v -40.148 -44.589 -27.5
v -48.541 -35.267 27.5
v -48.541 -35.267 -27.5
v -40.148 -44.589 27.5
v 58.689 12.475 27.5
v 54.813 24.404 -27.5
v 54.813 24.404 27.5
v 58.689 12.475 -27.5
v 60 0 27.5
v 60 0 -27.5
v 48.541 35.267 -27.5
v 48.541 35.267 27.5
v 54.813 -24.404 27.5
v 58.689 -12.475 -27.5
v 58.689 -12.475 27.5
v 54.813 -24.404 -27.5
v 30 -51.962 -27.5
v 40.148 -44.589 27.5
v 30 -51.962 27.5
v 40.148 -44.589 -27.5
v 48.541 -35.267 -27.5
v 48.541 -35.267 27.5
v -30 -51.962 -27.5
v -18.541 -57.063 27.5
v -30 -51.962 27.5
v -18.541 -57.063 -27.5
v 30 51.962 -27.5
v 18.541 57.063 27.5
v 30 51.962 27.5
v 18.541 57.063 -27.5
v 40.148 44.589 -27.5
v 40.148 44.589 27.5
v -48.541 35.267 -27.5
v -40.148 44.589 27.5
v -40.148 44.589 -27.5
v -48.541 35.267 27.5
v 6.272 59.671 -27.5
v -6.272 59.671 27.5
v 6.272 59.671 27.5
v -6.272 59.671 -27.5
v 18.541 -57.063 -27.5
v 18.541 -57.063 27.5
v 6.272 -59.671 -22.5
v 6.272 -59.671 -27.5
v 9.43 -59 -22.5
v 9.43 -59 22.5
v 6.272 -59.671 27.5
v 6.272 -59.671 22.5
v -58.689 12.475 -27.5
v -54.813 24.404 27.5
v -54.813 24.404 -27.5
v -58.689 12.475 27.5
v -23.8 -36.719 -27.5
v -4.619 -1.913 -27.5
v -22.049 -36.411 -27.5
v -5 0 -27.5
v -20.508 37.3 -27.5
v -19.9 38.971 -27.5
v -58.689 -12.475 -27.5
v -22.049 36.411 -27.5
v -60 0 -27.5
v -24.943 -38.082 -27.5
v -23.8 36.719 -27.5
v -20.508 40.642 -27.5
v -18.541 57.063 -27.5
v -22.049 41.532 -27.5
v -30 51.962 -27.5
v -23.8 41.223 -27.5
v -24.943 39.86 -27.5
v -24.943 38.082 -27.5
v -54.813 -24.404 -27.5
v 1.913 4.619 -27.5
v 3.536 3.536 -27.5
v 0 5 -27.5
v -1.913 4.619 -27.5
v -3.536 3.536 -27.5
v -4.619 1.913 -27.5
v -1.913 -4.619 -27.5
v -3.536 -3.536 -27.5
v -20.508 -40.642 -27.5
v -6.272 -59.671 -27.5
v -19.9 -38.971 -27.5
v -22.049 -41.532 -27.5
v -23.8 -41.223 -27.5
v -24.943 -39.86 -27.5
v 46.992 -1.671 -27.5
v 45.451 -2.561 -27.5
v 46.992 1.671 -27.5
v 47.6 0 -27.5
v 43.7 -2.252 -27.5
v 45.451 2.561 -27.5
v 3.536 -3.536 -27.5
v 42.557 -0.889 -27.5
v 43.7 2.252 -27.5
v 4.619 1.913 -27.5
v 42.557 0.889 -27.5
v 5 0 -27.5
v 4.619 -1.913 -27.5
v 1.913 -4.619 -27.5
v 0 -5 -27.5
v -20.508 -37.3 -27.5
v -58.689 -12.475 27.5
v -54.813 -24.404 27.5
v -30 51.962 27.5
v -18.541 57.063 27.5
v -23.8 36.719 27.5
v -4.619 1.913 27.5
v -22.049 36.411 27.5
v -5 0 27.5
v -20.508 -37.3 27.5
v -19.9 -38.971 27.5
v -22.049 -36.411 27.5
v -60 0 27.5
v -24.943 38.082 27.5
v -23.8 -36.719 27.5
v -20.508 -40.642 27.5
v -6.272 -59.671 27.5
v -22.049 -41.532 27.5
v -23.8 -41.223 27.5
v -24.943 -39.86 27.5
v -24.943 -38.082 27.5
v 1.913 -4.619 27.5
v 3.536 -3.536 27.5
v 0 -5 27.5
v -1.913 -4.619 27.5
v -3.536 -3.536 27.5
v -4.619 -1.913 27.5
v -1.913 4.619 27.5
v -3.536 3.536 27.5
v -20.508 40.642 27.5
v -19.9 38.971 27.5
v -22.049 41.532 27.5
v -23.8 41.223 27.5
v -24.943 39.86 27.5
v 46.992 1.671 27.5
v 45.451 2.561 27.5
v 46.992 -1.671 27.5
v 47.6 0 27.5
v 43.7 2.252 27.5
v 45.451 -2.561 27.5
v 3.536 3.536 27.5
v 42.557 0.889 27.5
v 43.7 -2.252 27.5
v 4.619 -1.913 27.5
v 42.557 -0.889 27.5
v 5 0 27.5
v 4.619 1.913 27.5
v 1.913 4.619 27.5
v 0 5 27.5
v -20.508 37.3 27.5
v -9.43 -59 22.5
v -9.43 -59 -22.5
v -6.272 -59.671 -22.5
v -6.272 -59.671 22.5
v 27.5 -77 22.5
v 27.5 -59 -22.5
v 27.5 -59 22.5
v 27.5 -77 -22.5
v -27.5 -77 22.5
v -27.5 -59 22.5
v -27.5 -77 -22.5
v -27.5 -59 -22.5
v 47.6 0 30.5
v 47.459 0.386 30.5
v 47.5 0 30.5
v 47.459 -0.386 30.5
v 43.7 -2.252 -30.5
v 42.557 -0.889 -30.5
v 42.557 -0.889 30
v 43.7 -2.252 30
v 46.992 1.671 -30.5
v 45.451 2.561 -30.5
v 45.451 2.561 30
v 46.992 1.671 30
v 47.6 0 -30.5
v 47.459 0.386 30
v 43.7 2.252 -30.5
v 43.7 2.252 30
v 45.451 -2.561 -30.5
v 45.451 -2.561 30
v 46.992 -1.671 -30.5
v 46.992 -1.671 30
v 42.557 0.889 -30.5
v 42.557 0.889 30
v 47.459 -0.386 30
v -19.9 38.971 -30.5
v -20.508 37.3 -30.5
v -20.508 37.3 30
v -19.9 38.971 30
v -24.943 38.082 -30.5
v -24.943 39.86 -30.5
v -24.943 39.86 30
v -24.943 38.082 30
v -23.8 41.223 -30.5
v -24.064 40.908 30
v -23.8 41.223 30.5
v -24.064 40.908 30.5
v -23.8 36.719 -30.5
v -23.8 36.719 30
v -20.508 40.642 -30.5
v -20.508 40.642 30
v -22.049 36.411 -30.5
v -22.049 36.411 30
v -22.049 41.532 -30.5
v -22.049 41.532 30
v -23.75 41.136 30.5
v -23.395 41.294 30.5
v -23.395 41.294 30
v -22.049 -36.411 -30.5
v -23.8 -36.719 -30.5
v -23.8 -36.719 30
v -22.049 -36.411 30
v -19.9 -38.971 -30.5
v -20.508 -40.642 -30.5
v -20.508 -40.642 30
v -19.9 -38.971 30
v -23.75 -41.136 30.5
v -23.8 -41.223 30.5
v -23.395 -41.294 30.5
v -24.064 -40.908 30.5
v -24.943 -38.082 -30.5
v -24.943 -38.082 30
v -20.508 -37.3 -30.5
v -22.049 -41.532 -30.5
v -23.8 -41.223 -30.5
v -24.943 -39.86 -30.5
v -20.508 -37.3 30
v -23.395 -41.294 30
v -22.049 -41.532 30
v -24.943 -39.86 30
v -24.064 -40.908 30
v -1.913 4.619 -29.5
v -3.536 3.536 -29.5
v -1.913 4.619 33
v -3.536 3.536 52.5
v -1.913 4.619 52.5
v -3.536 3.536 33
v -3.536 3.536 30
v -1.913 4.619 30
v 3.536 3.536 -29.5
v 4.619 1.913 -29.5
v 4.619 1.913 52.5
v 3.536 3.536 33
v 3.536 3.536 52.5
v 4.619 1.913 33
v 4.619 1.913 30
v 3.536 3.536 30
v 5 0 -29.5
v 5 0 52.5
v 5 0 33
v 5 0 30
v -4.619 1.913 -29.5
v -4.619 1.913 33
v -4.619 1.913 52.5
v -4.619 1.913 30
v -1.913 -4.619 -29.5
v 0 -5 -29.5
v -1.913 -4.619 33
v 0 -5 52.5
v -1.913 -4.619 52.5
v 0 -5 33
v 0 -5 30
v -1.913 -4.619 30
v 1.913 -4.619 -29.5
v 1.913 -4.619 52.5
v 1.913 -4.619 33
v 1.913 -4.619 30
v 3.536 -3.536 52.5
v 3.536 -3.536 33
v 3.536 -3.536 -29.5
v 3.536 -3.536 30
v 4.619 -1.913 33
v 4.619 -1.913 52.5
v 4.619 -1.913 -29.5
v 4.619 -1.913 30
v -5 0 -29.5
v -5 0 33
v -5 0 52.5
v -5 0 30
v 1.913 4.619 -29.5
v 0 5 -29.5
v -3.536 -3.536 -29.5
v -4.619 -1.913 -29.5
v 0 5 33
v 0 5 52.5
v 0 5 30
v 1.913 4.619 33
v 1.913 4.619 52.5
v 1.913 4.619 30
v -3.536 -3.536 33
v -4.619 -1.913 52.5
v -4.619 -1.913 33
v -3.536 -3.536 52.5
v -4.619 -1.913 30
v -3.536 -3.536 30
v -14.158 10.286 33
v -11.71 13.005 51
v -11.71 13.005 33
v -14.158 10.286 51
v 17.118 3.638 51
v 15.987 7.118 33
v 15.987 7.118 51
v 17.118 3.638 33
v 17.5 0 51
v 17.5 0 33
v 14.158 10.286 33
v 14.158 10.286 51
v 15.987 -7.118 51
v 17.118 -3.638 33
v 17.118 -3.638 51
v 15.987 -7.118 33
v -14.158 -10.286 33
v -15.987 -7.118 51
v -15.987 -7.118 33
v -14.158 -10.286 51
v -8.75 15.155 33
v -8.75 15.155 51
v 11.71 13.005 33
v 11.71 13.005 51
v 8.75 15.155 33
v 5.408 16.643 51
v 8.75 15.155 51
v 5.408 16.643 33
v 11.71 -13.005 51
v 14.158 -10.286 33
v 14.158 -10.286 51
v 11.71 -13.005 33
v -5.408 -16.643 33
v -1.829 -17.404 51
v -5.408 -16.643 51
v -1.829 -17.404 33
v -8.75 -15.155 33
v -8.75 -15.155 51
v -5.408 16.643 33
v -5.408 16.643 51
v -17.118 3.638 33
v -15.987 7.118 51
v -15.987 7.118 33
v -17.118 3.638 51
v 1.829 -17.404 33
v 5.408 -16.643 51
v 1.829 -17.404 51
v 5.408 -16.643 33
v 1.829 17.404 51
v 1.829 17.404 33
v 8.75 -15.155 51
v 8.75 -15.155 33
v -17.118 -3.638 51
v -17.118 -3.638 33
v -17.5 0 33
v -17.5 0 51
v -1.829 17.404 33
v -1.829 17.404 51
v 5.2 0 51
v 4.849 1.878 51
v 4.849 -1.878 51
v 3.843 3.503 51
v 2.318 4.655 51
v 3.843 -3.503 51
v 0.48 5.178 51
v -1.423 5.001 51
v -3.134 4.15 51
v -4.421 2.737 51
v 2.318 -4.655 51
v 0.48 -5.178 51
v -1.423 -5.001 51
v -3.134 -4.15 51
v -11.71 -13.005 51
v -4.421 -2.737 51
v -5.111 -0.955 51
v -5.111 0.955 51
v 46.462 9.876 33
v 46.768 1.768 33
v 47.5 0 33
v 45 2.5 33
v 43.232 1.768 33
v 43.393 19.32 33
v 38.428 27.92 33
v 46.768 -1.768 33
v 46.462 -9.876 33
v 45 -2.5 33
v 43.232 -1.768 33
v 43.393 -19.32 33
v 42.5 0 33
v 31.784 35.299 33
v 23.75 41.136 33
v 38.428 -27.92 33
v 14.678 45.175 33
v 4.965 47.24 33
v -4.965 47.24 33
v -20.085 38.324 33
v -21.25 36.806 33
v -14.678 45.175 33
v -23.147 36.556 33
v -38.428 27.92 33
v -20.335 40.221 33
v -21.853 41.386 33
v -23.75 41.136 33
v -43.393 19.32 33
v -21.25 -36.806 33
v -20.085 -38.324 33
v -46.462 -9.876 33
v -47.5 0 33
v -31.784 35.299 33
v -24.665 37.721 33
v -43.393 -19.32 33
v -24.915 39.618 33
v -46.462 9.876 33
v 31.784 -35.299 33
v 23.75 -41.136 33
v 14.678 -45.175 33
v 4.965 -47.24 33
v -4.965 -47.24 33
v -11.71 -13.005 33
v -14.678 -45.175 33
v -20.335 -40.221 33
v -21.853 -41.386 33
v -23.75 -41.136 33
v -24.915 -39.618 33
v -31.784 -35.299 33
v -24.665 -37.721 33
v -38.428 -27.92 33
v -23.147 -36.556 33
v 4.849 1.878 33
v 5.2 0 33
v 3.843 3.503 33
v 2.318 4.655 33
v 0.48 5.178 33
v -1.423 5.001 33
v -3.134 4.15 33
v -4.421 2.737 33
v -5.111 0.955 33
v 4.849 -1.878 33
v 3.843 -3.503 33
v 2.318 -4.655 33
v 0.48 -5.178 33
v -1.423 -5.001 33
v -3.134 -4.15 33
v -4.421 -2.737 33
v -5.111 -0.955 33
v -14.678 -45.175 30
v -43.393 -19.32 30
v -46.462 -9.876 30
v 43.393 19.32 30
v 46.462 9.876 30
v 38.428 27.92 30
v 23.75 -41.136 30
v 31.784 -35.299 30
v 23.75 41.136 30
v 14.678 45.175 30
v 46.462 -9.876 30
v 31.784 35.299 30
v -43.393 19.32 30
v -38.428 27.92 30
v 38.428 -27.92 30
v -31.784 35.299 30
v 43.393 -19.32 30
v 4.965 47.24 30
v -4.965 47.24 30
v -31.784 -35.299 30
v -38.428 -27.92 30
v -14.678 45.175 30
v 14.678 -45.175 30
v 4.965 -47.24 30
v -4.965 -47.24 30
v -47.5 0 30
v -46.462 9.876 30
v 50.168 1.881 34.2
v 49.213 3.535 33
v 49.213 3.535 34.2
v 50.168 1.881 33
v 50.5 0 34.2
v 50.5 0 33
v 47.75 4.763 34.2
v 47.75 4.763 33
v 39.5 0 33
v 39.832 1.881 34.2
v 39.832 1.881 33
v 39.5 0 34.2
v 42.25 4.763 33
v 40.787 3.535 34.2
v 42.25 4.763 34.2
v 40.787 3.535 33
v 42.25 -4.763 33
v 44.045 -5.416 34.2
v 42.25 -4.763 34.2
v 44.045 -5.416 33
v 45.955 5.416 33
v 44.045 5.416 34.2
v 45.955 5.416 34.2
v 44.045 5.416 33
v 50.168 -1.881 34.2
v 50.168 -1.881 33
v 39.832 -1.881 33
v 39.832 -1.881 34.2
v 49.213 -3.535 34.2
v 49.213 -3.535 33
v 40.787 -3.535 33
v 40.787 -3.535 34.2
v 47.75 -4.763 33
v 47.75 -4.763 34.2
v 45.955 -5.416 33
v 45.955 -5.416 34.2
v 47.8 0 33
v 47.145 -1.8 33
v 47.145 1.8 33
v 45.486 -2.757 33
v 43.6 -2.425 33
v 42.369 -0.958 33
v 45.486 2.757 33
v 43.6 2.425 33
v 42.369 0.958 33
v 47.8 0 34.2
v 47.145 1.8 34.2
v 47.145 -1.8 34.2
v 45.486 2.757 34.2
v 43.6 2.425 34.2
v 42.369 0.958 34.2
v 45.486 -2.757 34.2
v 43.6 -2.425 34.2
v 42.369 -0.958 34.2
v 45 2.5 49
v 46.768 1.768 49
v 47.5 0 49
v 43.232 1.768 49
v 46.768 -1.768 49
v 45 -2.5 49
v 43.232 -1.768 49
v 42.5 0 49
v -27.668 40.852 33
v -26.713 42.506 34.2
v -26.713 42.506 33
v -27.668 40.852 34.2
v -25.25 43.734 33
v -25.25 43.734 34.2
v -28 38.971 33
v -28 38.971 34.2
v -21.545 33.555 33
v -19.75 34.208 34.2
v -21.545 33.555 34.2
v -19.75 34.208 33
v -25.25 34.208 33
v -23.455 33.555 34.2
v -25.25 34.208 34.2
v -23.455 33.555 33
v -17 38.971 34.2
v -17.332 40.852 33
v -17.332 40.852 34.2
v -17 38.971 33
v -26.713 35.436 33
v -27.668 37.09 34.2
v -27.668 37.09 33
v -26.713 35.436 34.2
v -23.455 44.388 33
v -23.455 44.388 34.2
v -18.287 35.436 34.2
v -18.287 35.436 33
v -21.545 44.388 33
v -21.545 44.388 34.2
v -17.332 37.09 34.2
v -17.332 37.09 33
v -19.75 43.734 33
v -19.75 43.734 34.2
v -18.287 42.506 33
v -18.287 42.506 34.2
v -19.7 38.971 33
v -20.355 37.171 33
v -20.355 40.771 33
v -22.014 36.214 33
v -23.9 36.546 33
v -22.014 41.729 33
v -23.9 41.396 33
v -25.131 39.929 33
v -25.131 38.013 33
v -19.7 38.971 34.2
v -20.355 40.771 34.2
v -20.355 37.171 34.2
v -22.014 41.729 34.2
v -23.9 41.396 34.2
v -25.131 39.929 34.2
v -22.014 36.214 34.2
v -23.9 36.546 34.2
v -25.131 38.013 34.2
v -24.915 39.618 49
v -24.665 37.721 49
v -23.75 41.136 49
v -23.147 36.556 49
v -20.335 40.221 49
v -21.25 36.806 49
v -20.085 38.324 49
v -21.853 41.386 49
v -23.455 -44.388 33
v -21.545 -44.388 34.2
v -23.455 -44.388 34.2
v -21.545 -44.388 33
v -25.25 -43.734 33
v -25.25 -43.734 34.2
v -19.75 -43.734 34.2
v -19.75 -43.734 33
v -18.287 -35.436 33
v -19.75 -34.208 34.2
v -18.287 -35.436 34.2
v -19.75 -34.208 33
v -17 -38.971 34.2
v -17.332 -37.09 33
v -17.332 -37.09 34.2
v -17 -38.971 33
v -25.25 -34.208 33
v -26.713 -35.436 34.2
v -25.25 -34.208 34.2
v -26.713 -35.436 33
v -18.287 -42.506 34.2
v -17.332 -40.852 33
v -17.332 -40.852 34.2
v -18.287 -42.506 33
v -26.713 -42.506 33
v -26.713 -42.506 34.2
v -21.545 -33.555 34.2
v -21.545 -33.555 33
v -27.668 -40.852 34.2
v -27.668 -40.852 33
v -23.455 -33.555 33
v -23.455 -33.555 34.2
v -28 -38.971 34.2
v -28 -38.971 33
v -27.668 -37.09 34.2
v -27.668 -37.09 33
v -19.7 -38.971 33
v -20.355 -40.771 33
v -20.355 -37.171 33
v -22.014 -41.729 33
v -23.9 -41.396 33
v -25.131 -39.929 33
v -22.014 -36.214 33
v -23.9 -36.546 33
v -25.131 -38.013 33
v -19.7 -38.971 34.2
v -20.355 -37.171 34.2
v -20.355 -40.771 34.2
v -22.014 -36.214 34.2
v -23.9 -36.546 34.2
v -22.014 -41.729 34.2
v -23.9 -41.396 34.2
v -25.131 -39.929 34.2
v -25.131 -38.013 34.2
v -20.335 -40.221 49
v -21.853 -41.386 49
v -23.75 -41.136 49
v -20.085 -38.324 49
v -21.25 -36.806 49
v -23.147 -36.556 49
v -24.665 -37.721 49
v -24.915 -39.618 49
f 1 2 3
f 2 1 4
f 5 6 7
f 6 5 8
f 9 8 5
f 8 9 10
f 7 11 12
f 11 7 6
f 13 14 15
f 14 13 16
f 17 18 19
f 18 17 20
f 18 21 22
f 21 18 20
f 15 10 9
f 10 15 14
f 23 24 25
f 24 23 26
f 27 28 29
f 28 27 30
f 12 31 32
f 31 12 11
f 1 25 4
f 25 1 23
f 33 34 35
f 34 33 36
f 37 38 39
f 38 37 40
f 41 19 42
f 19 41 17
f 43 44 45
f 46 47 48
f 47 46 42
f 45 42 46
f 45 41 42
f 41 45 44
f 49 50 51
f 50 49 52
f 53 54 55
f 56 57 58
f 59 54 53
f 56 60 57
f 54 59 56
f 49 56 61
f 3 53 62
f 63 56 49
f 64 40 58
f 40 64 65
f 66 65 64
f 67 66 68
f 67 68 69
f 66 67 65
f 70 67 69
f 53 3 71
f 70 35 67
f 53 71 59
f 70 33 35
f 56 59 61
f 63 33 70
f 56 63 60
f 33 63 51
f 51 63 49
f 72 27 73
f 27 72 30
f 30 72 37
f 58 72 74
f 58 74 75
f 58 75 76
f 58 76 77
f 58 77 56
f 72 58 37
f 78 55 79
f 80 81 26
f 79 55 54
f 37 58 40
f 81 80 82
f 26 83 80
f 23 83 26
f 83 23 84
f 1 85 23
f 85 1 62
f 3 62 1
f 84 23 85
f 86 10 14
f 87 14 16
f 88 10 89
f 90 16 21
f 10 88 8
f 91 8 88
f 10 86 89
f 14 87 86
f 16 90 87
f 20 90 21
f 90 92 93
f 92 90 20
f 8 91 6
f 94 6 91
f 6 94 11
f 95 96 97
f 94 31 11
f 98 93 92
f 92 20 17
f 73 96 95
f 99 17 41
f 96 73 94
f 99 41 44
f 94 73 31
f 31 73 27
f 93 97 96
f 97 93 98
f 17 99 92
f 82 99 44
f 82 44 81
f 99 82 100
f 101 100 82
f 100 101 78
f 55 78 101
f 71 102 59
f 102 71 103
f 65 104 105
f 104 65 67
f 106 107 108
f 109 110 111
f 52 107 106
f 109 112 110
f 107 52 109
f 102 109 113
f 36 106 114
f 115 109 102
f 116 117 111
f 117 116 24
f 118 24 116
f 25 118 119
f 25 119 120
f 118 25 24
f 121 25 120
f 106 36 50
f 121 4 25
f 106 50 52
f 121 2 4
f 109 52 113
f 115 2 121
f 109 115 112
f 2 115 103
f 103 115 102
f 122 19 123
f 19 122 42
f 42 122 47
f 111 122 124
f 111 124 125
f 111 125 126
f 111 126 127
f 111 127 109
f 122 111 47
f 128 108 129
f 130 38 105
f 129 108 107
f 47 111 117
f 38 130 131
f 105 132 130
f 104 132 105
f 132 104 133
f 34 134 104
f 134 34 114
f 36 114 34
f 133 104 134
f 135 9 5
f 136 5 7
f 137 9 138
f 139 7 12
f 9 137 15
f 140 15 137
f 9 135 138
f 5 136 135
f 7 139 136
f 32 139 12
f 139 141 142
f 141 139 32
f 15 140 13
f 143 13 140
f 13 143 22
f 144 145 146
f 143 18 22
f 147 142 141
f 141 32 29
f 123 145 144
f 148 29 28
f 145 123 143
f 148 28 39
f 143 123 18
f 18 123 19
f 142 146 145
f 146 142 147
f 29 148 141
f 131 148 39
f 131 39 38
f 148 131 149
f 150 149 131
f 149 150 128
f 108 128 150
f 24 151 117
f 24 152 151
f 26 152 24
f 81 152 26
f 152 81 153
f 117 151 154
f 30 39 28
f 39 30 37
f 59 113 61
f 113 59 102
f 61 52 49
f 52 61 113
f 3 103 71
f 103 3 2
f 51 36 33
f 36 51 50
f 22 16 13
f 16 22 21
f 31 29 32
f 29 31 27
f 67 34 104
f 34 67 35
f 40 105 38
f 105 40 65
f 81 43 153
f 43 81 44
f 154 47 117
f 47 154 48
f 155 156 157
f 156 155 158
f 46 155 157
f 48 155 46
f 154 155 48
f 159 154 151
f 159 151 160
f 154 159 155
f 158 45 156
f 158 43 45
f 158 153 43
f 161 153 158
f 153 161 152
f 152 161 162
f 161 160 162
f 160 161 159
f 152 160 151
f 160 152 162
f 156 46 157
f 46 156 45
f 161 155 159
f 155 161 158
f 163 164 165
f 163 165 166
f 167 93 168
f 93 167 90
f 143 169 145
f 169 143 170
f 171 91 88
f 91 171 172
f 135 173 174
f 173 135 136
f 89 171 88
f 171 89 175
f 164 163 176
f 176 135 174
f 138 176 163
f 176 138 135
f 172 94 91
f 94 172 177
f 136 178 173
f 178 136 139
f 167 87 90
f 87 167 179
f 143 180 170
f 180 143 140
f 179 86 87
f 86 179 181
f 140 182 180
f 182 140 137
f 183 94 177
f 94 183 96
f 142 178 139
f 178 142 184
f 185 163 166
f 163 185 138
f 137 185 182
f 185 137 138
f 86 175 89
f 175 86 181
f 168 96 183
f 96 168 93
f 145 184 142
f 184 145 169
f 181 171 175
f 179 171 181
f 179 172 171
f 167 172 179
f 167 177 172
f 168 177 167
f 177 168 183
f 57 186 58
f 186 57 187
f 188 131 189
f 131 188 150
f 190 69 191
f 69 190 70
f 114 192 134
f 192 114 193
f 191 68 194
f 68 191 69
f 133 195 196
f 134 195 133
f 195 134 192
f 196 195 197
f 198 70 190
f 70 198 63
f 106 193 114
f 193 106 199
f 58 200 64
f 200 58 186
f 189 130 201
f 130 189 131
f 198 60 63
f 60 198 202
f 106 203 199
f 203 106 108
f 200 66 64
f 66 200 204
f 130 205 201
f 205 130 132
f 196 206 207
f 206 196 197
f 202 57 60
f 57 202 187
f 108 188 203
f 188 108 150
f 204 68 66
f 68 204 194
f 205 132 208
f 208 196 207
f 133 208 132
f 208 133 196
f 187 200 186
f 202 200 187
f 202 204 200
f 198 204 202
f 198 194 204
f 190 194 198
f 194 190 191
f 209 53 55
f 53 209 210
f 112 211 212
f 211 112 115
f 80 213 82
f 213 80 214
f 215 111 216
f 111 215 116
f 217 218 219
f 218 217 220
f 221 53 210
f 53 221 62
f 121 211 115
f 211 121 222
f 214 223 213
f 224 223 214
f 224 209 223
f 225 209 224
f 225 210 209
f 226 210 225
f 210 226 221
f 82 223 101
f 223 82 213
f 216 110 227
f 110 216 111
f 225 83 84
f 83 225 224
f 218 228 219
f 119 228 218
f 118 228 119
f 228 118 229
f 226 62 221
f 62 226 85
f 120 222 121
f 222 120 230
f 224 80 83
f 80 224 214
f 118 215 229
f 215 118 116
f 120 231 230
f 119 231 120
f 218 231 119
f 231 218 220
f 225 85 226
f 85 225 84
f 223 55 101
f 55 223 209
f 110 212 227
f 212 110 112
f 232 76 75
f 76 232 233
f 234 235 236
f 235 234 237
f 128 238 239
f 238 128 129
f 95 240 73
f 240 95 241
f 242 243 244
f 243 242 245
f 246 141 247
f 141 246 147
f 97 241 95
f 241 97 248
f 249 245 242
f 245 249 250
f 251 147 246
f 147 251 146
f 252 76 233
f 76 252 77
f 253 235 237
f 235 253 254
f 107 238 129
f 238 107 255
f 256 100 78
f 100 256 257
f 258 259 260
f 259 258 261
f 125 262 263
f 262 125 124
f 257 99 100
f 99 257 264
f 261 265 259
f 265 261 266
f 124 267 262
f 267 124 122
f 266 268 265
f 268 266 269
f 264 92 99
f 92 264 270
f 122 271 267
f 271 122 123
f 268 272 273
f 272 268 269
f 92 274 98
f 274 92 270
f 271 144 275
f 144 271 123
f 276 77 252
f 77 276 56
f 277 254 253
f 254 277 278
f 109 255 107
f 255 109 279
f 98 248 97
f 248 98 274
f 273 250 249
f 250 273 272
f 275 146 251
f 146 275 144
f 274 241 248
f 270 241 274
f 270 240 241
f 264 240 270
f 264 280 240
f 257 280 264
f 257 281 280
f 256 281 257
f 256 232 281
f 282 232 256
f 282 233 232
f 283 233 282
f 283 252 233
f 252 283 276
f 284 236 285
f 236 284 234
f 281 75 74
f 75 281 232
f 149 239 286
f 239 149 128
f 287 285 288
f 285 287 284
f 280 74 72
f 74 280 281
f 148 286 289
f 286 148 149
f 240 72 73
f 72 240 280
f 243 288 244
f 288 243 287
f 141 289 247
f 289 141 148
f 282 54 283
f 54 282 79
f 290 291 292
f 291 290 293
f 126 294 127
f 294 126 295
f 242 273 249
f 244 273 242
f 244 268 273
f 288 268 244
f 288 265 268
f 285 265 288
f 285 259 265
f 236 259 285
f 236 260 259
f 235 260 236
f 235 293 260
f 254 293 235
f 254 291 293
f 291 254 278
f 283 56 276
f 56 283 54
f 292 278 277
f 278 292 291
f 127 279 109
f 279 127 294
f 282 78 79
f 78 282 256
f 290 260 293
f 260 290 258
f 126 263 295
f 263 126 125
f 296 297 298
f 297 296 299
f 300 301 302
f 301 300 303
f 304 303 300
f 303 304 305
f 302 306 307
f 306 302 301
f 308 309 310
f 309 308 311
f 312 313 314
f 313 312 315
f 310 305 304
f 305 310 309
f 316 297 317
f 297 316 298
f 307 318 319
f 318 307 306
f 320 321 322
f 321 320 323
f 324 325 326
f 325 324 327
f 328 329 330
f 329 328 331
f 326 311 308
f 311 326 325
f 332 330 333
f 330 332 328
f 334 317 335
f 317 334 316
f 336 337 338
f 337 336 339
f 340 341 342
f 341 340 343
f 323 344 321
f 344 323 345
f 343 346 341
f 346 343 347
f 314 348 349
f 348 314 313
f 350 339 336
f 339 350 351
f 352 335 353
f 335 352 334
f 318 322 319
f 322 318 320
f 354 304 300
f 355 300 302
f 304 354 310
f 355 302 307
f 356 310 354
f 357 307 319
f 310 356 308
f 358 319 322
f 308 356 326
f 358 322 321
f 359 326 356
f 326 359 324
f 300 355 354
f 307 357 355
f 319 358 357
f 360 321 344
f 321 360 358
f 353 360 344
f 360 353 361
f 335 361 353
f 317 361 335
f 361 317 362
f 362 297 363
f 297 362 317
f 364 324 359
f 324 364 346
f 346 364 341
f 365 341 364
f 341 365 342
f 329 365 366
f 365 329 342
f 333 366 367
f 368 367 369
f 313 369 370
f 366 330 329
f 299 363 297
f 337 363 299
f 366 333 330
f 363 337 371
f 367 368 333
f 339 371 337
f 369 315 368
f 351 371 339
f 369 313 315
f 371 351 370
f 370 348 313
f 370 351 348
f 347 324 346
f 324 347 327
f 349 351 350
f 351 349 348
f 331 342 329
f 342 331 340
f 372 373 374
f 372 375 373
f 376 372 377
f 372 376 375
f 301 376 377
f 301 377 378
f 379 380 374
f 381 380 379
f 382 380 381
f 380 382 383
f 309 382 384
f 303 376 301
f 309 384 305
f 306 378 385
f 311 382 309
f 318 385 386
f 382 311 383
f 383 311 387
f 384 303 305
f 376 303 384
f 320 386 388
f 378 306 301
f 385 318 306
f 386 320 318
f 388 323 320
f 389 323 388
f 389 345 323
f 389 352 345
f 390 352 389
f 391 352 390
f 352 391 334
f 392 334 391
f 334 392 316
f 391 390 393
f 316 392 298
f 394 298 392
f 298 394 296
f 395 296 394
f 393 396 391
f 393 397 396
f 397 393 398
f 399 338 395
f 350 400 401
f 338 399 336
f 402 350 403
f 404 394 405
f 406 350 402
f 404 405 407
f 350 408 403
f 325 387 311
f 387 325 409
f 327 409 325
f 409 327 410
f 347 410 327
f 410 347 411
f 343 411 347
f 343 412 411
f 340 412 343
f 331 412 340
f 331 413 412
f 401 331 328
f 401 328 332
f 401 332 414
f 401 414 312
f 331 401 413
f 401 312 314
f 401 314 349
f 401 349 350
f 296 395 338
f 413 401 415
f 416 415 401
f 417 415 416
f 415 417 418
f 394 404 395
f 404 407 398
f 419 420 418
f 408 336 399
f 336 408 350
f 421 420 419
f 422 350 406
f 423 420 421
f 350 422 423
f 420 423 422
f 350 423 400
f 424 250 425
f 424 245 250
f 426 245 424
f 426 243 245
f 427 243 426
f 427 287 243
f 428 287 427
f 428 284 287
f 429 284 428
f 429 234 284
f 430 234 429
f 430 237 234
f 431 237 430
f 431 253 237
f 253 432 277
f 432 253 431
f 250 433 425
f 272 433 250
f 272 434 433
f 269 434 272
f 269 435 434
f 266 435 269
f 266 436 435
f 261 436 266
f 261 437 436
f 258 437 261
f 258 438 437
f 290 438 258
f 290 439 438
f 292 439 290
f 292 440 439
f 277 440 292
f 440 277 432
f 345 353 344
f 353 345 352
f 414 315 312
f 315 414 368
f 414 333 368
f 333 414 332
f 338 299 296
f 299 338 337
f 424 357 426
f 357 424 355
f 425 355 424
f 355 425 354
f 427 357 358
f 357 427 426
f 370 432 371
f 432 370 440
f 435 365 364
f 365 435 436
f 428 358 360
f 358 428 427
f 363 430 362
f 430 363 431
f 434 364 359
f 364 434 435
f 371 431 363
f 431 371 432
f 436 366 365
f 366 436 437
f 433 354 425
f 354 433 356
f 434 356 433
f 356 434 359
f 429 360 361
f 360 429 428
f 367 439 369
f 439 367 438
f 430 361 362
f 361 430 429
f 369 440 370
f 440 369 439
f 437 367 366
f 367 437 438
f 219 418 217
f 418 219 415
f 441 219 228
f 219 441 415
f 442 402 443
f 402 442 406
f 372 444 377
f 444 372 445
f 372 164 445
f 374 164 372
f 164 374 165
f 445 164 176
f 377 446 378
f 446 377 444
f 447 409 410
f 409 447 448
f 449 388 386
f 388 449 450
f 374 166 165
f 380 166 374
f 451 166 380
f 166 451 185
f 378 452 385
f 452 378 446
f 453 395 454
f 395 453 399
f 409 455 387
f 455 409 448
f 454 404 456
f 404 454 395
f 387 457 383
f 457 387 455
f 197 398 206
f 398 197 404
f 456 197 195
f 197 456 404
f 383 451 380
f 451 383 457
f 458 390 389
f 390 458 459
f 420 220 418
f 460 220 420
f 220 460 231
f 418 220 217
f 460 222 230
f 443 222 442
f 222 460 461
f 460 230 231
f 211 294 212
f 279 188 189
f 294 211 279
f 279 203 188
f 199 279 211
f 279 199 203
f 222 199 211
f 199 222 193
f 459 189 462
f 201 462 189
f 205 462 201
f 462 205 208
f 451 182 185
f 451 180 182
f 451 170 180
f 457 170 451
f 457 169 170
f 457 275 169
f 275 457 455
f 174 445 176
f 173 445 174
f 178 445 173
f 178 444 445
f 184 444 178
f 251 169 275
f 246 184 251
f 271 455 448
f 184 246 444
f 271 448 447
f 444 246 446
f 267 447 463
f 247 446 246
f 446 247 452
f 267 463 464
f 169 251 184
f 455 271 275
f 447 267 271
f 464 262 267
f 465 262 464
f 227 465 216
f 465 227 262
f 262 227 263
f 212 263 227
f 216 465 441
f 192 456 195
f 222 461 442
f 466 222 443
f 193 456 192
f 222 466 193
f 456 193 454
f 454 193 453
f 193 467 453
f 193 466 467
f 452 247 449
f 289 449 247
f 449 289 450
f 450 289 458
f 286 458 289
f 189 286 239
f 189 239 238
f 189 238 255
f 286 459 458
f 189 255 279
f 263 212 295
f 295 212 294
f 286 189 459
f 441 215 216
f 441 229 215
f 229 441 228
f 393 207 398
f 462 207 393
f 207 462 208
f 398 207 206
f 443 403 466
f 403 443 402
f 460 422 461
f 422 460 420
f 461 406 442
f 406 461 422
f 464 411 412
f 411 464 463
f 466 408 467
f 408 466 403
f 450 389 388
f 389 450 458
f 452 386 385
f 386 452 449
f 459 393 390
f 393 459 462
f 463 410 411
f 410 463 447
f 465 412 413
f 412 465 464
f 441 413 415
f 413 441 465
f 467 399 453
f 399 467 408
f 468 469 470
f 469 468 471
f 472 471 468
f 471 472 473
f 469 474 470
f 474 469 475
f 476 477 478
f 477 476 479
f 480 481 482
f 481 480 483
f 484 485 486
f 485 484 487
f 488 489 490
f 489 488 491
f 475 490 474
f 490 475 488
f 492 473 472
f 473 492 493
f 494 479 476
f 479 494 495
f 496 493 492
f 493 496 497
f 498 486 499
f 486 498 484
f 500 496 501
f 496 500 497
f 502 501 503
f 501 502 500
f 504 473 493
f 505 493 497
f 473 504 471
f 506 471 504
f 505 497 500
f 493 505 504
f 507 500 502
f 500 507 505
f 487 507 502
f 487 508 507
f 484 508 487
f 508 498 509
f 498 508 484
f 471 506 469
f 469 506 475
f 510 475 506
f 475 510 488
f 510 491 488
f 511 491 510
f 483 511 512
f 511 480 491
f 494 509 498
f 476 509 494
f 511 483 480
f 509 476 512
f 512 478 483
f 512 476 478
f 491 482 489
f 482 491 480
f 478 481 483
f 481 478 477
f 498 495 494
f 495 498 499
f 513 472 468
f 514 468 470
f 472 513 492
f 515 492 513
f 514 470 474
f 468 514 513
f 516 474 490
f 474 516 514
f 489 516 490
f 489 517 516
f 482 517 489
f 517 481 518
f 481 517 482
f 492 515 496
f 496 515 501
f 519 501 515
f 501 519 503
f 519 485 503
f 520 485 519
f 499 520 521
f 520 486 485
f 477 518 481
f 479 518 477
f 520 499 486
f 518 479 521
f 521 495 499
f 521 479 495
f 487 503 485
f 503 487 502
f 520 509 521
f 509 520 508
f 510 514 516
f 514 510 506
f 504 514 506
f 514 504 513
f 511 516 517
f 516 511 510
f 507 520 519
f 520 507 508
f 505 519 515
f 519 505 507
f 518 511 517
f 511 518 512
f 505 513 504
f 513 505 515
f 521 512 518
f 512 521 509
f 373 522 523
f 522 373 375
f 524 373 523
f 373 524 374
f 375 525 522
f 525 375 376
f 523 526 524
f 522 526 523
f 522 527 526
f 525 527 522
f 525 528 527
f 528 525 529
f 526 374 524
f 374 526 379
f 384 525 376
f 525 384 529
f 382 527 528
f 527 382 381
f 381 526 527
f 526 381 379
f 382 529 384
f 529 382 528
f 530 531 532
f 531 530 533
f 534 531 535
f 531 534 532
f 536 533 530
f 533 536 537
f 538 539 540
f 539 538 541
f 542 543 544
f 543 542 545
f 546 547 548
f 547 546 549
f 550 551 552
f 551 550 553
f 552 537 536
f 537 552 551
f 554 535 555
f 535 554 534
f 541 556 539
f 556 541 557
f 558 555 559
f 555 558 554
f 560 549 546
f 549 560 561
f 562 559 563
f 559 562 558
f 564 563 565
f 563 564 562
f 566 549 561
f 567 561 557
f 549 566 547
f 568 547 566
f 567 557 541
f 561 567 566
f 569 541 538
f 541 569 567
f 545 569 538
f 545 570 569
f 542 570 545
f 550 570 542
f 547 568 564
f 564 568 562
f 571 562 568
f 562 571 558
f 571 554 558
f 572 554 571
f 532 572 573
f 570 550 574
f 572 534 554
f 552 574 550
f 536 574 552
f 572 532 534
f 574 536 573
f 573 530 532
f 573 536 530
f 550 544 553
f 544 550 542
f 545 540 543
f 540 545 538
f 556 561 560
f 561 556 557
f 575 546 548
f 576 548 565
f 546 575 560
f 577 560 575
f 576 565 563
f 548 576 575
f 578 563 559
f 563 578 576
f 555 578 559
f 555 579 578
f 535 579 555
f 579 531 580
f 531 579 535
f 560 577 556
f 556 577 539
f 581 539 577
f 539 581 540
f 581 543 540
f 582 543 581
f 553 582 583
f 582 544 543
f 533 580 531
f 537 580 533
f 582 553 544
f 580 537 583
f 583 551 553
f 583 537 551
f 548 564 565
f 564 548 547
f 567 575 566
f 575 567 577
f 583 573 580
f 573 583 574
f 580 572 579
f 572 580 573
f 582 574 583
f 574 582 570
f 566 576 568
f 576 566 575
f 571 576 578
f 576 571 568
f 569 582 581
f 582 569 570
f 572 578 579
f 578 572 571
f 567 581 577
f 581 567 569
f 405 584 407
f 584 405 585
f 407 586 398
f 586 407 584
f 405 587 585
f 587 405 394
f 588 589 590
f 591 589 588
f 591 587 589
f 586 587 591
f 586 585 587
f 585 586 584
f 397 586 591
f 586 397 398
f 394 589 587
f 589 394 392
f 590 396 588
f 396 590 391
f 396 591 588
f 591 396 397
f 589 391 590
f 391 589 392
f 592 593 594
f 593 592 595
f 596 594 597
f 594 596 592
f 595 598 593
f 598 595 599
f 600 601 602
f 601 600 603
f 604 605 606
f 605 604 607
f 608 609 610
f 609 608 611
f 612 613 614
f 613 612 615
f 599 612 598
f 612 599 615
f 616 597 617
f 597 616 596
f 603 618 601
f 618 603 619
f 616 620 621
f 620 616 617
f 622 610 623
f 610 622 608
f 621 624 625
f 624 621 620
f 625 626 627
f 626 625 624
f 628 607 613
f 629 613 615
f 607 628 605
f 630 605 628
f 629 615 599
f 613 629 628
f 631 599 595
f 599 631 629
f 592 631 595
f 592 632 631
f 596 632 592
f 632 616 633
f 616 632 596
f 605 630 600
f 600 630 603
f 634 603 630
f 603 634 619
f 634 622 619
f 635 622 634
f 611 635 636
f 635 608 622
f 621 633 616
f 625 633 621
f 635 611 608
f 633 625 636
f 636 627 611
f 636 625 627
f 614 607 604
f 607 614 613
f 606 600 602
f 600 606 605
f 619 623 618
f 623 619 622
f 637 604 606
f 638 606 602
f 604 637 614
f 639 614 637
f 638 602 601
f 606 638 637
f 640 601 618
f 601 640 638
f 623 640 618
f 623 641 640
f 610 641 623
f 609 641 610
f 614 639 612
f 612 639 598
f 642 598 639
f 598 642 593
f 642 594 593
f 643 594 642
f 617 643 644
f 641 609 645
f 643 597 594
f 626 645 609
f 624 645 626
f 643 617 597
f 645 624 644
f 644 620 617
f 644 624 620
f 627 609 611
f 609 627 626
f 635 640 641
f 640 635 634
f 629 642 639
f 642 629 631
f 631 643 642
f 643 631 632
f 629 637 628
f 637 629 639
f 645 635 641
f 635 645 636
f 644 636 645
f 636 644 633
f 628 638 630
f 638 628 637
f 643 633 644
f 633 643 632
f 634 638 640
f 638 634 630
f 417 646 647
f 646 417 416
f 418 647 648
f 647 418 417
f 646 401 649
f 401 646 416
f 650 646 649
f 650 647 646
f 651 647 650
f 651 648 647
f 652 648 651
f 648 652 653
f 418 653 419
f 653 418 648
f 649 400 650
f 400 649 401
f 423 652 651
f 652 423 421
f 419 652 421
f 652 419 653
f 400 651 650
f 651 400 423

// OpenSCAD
// Parameters
thickness = 3; //[1.5:6:0.5]
include_dial = 1; //[0:1:1]
body_diameter = 120; //[60:240:1]
body_height = 55; //[28:110:1]
bulge_width = 55; //[28:110:1]
bulge_depth = 18; //[9:36:1]
bulge_height = 45; //[22:90:1]
bulge_overlap = 1; //[0.5:2:0.1]
shaft_diameter = 10; //[5:20:0.5]
shaft_length = 25; //[12:50:1]
shaft_embed = 2; //[0.5:5:0.5]
mount_hole_count = 3; //[2:6:1]
mount_hole_radius = 2.6; //[1.5:4:0.1]
mount_hole_bcd = 90; //[45:180:1]
dial_diameter = 95; //[48:190:1]
dial_thickness = 3; //[1.5:8:0.5]
dial_clearance = 0.5; //[0.2:2:0.1]
knob_diameter = 35; //[18:70:1]
knob_height = 18; //[9:36:1]
knob_shaft_hole_radius = 5.2; //[2.6:10:0.1]
hardware_screw_radius = 2.5; //[1.5:4:0.1]
hardware_screw_length = 16; //[8:32:1]
washer_outer_radius = 5.5; //[3:11:0.1]
washer_thickness = 1.2; //[0.6:3:0.1]

// Variac - complete geometry
module variac() {
  color("DimGray") {
    // Main body with bulge
    union() {
      translate([0, 0, 0])
        cylinder(r=body_diameter/2, h=body_height, center=true);
      translate([0, -(body_diameter/2 + bulge_depth/2 - bulge_overlap), 0])
        cube([bulge_width, bulge_depth, bulge_height], center=true);
    }
    
    // Shaft
    translate([0, 0, (shaft_length - shaft_embed)/2])
      cylinder(r=shaft_diameter/2, h=body_height + shaft_length + shaft_embed, center=true);
    
    // Mounting holes
    for (i = [0:mount_hole_count-1]) {
      rotate([0, 0, i*360/mount_hole_count])
        translate([mount_hole_bcd/2, 0, 0])
          cylinder(r=mount_hole_radius, h=body_height + 2*thickness, center=true);
    }
  }
}

// Dial and Knob assembly
module dial_and_knob() {
  if (include_dial) {
    color("Silver") {
      // Dial face
      translate([0, 0, body_height/2 + thickness + dial_thickness/2 - dial_clearance])
        cylinder(r=dial_diameter/2, h=dial_thickness, center=true);
      
      // Knob
      translate([0, 0, body_height/2 + thickness + dial_thickness + knob_height/2 - dial_clearance])
        difference() {
          cylinder(r=knob_diameter/2, h=knob_height, center=true);
          cylinder(r=knob_shaft_hole_radius, h=knob_height + 2*thickness, center=true);
        }
    }
  }
}

// Screw and Washer assembly
module screw_and_washer_set() {
  color("Silver") {
    for (i = [0:mount_hole_count-1]) {
      rotate([0, 0, i*360/mount_hole_count]) {
        translate([mount_hole_bcd/2, 0, body_height/2 + thickness + dial_thickness + hardware_screw_length/2 - dial_clearance])
          cylinder(r=hardware_screw_radius, h=hardware_screw_length, center=true);
        
        translate([mount_hole_bcd/2, 0, body_height/2 + thickness + dial_thickness + washer_thickness/2 - dial_clearance])
          difference() {
            cylinder(r=washer_outer_radius, h=washer_thickness, center=true);
            cylinder(r=hardware_screw_radius + thickness/10, h=washer_thickness + 2*thickness/10, center=true);
          }
      }
    }
  }
}

// Assembly
module assembly() {
  variac();
  dial_and_knob();
  screw_and_washer_set();
}

assembly();
